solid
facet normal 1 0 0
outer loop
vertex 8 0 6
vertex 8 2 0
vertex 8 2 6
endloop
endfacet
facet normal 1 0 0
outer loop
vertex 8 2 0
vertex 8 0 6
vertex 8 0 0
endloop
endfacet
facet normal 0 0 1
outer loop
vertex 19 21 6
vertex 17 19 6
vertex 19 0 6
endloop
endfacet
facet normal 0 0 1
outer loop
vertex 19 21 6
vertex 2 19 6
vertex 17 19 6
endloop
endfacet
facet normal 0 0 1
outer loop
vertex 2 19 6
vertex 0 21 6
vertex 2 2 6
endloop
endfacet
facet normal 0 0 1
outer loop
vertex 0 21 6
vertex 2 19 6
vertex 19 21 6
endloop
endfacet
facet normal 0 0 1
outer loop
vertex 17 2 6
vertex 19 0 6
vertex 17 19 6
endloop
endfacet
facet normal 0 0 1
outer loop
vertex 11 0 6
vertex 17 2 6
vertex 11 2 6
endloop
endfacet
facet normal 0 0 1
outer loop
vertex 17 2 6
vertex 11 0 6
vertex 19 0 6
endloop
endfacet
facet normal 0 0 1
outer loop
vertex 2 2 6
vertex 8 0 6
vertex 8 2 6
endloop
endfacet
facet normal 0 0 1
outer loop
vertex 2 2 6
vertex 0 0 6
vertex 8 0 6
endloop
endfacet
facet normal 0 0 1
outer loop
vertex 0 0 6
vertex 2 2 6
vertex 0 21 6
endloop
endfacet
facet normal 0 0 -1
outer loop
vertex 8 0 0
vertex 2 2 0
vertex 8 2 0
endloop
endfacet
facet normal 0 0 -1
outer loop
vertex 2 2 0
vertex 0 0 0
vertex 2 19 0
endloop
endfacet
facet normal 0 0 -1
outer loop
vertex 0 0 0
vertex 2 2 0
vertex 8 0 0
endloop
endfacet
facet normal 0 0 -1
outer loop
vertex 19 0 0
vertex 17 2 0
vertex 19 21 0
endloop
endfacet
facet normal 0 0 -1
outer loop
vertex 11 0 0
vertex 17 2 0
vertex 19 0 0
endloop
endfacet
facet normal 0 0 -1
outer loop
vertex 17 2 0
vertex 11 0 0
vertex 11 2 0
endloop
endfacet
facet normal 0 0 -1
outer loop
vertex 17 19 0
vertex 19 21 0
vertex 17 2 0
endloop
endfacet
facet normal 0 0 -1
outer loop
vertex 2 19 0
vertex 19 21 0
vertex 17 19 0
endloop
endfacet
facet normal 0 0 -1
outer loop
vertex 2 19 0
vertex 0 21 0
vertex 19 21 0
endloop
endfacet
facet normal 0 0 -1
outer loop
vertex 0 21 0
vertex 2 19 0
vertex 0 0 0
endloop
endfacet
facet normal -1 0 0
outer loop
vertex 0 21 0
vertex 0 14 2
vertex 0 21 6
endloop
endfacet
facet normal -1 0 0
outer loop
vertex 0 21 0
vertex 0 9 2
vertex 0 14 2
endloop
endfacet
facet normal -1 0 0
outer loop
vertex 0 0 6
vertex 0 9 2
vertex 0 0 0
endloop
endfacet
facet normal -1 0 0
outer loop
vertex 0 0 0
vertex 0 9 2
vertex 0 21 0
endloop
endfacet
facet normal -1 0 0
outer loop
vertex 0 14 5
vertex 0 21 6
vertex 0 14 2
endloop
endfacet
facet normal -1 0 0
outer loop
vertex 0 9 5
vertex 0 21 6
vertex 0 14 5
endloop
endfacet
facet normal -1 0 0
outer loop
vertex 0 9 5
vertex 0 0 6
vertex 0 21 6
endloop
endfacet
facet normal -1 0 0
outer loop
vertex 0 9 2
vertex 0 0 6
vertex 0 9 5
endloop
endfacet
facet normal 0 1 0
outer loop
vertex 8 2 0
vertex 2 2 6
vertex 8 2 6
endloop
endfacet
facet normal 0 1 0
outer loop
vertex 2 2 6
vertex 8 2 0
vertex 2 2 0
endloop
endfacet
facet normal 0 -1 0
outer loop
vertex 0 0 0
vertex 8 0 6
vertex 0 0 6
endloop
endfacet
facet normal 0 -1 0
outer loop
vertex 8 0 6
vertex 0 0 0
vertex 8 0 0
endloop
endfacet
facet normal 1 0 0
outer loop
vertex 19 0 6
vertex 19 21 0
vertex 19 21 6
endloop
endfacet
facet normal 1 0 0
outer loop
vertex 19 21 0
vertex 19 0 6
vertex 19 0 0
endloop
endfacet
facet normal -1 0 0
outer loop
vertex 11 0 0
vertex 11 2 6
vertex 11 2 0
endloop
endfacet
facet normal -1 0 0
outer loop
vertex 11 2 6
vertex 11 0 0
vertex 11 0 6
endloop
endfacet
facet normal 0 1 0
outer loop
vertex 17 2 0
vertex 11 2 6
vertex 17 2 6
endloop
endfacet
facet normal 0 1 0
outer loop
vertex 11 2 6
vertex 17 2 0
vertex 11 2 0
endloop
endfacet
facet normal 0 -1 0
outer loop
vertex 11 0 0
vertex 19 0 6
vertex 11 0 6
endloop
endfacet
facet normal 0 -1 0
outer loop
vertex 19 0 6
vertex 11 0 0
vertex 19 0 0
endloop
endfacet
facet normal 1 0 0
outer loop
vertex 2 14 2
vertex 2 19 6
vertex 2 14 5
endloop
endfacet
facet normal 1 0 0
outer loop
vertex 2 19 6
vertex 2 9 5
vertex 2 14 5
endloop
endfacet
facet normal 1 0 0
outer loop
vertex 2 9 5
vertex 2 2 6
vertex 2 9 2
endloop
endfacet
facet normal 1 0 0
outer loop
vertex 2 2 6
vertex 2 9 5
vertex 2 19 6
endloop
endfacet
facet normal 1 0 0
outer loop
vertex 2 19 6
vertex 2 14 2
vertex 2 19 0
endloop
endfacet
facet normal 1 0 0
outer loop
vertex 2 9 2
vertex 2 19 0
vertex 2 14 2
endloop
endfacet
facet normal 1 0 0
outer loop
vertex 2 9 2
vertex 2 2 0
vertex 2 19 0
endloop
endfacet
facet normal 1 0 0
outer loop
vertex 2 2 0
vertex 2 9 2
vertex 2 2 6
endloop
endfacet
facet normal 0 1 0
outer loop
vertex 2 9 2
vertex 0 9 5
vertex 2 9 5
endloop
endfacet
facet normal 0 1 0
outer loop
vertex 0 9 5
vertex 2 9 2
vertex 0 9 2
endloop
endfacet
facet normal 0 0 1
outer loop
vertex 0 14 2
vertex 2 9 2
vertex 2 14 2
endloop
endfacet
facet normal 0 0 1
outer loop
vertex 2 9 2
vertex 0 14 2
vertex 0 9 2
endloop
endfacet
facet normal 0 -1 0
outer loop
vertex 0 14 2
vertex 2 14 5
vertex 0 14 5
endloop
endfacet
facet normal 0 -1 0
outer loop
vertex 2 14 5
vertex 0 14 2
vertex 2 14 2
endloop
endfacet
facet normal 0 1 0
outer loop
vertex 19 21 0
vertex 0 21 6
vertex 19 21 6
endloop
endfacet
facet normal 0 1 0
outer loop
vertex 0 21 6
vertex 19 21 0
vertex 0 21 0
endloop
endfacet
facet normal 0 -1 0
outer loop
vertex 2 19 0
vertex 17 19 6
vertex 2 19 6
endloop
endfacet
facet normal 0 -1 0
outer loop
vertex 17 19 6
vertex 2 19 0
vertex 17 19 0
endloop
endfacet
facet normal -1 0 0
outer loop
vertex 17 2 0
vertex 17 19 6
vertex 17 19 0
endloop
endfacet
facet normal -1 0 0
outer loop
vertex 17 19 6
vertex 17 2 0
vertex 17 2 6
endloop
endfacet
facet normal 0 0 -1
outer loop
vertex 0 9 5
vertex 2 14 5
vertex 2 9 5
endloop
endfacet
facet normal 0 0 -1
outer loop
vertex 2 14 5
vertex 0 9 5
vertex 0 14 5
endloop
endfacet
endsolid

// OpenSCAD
cube([8,2,6]);
translate([11,0,0])cube([8,2,6]);
translate([0,2,0])cube([2,7,6]);
translate([0,8,0])cube([2,6,2]);
translate([0,14,0])cube([2,7,6]);
translate([1,19,0])cube([8,2,6]);
translate([9,19,0])cube([8,2,6]);
translate([17,2,0])cube([2,19,6]);
translate([0,9,5])cube([2,5,1,]);cube([8,2,6]);
translate([11,0,0])cube([8,2,6]);
translate([0,2,0])cube([2,7,6]);
translate([0,8,0])cube([2,6,2]);
translate([0,14,0])cube([2,7,6]);
translate([1,19,0])cube([8,2,6]);
translate([9,19,0])cube([8,2,6]);
translate([17,2,0])cube([2,19,6]);
translate([0,9,5])cube([2,5,1,]);
